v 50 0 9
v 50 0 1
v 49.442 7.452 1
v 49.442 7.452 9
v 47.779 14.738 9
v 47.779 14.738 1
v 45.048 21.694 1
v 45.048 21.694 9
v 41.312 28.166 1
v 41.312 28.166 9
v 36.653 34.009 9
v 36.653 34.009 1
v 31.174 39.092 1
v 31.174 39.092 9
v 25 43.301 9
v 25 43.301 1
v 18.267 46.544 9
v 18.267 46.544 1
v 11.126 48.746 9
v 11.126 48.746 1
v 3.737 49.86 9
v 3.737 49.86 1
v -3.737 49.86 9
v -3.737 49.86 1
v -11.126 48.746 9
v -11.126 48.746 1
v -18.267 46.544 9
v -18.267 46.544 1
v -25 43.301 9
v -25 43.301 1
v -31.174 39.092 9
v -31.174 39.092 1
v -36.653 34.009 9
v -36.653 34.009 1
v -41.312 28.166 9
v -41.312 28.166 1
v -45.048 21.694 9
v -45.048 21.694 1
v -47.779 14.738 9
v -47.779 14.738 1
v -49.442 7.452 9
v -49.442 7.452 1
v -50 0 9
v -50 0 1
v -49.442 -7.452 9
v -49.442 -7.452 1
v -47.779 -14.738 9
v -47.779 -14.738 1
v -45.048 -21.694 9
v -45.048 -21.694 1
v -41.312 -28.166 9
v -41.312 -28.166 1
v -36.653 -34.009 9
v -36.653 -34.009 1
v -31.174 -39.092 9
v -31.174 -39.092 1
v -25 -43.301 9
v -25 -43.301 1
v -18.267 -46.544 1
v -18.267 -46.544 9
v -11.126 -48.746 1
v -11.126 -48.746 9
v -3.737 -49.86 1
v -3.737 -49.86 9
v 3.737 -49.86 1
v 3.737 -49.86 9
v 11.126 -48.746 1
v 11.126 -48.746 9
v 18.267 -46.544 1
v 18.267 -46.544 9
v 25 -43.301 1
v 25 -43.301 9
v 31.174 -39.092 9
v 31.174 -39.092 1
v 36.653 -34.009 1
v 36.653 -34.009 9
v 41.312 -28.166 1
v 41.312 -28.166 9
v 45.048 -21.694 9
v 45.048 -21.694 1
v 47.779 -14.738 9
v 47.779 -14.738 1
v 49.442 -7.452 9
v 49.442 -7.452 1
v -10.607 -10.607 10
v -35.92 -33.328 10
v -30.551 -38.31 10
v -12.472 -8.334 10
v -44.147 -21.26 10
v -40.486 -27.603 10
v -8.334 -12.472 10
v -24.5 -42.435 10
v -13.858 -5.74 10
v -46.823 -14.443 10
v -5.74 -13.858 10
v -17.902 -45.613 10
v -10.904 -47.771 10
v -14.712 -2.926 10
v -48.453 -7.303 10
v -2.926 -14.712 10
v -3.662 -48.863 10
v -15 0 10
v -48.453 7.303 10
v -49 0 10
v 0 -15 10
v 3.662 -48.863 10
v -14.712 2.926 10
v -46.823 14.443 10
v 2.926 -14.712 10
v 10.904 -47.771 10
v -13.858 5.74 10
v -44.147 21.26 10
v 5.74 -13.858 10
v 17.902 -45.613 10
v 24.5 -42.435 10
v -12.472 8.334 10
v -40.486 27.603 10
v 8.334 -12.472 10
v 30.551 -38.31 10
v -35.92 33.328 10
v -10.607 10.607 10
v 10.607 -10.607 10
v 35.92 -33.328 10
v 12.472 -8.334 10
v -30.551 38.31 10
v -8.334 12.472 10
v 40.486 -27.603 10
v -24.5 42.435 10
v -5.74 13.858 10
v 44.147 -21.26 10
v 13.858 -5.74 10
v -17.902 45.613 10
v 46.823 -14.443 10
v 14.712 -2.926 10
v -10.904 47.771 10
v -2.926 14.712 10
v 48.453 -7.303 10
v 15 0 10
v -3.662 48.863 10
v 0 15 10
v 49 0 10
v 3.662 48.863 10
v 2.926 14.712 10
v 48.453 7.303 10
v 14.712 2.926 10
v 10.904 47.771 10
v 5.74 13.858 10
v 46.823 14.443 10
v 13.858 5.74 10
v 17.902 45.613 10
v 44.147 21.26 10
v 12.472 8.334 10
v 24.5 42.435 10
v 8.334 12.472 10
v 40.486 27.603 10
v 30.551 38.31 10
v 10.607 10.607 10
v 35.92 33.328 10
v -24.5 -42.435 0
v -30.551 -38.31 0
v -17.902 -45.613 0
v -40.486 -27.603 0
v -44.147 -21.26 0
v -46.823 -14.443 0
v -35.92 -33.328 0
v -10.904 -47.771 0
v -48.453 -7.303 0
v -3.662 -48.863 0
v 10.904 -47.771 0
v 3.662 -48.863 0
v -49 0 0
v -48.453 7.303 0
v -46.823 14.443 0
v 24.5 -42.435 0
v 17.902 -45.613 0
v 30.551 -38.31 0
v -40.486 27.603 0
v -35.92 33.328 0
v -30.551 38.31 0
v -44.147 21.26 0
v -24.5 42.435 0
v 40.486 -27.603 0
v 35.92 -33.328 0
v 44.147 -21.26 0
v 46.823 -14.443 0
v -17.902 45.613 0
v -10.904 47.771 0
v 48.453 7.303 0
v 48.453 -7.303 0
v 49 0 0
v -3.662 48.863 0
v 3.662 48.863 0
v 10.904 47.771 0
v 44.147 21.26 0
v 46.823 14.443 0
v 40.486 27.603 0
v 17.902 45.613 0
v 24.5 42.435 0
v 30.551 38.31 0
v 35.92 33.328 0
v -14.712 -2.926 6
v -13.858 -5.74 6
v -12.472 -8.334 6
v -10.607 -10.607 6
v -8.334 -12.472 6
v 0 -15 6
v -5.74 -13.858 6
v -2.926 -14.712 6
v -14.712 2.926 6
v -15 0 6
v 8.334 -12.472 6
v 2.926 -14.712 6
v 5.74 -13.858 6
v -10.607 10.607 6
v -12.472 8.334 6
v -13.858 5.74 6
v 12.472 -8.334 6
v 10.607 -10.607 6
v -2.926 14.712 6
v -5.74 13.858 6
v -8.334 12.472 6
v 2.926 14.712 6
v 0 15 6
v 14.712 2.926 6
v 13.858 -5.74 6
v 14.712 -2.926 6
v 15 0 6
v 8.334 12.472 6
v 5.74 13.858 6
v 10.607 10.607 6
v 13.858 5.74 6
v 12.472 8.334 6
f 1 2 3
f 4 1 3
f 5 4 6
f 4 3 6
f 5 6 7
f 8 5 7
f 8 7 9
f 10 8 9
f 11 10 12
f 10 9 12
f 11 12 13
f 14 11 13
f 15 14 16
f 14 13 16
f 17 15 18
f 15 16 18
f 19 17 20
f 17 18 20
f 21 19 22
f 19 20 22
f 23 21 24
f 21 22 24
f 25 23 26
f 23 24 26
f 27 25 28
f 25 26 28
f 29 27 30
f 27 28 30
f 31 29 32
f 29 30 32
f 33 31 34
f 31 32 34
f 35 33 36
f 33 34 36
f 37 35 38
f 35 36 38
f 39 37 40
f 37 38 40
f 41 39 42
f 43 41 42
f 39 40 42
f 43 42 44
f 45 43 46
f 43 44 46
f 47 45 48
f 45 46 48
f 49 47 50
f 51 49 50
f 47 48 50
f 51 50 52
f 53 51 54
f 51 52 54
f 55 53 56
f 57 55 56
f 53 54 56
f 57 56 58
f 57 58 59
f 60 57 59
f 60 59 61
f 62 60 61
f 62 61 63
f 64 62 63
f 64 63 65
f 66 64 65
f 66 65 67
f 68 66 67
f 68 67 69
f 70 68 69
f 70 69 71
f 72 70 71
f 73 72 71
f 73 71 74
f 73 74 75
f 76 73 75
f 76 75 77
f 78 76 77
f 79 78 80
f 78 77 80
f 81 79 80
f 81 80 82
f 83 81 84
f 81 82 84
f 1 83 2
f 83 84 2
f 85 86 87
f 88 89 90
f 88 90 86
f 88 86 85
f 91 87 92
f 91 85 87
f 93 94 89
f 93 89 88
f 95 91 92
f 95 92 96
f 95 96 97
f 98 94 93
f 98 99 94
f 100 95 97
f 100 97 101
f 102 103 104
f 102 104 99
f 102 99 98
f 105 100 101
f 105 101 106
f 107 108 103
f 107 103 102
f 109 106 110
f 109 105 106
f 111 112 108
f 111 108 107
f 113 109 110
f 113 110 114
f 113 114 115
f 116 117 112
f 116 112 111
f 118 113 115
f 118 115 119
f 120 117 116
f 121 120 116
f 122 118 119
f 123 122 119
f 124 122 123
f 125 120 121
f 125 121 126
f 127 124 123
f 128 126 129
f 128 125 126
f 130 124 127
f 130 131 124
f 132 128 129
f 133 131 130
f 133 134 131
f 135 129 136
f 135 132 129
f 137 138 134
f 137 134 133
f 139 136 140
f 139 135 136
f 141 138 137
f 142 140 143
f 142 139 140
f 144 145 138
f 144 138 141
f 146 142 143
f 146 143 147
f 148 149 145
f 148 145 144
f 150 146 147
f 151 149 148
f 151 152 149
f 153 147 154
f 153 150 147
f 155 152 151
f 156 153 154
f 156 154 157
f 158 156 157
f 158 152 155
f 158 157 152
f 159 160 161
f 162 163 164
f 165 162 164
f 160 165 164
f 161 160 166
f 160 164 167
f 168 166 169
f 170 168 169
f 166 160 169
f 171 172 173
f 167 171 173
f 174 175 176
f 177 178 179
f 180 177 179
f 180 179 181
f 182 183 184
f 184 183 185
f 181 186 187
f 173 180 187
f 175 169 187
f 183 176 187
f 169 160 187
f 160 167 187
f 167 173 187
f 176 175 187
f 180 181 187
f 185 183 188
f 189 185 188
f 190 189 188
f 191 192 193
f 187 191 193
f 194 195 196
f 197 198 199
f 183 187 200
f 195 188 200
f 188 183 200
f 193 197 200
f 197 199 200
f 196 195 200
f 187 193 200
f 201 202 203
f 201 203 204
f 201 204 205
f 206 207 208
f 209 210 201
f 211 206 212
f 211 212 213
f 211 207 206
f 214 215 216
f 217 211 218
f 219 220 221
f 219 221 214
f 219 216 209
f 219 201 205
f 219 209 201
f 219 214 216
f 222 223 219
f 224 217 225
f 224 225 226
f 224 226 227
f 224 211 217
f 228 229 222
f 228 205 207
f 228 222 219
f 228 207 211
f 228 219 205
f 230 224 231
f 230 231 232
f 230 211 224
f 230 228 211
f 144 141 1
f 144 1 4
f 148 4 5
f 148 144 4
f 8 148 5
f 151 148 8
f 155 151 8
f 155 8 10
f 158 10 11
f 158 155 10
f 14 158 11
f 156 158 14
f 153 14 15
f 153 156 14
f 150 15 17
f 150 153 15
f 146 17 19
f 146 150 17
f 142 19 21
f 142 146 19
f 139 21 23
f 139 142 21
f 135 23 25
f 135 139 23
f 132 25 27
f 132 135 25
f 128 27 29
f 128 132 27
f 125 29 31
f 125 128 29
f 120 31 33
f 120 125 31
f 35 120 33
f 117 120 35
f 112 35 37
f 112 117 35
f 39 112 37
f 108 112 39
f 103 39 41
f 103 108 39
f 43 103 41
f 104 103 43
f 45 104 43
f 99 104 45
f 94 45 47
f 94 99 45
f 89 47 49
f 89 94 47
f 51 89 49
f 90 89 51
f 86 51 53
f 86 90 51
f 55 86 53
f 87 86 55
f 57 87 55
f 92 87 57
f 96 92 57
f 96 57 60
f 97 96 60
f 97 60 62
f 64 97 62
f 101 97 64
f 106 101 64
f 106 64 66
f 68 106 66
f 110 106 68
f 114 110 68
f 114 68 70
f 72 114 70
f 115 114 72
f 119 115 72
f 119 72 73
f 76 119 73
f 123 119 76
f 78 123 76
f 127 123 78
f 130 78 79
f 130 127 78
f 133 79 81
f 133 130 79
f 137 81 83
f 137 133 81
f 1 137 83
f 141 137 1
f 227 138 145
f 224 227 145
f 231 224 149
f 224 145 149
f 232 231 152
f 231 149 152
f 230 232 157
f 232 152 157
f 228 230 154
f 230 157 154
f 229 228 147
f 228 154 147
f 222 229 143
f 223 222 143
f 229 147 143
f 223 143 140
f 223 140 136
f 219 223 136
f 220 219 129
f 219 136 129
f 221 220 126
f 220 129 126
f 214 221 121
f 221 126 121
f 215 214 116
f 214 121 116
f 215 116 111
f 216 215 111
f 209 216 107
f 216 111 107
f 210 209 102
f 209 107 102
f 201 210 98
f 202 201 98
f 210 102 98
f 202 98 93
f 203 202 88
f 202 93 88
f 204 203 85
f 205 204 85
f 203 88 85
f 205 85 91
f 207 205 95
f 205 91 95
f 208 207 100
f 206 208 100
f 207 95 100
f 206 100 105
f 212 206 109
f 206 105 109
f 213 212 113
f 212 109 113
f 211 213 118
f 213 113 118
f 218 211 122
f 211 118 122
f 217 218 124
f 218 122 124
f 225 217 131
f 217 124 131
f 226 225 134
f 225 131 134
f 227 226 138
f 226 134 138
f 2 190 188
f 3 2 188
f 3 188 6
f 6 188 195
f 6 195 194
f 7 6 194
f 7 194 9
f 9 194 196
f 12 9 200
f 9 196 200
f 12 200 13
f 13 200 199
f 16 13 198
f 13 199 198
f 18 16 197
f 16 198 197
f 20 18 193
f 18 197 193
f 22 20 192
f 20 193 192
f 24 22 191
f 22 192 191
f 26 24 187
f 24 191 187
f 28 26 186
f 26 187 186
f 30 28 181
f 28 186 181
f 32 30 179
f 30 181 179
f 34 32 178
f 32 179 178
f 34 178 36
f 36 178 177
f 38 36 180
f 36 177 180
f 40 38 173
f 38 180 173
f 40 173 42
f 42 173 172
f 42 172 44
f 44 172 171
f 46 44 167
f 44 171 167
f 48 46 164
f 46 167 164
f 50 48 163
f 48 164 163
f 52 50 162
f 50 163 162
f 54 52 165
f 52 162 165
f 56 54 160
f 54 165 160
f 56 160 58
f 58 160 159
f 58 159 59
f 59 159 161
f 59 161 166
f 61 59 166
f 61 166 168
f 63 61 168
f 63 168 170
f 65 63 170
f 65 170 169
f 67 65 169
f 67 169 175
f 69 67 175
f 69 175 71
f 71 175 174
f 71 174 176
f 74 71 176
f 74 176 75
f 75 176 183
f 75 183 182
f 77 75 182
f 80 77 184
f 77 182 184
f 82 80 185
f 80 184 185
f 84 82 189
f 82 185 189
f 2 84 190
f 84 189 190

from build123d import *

# Parameters (mm, degrees)
F0_R     = 50
F1_DEPTH = 10
F2_R     = 15
F3_DEPTH = 4
F4_SIZE  = 1


with BuildPart() as f1:
    # F0 (on Top) → F1 (new body)
    with BuildSketch(Plane.XY):
        Circle(F0_R)
    extrude(amount=F1_DEPTH)

    # F2 (on face) → F3 (cut)
    with BuildSketch(Plane.XY.offset(10)):
        Circle(F2_R)
    extrude(amount=-F3_DEPTH, mode=Mode.SUBTRACT)

    # F4
    f4_edges = [f1.edges().sort_by_distance(p)[0] for p in [
        (-50, 0, 10),
        (-50, 0, 0),
    ]]
    chamfer(f4_edges, length=F4_SIZE)


solid = f1.part
